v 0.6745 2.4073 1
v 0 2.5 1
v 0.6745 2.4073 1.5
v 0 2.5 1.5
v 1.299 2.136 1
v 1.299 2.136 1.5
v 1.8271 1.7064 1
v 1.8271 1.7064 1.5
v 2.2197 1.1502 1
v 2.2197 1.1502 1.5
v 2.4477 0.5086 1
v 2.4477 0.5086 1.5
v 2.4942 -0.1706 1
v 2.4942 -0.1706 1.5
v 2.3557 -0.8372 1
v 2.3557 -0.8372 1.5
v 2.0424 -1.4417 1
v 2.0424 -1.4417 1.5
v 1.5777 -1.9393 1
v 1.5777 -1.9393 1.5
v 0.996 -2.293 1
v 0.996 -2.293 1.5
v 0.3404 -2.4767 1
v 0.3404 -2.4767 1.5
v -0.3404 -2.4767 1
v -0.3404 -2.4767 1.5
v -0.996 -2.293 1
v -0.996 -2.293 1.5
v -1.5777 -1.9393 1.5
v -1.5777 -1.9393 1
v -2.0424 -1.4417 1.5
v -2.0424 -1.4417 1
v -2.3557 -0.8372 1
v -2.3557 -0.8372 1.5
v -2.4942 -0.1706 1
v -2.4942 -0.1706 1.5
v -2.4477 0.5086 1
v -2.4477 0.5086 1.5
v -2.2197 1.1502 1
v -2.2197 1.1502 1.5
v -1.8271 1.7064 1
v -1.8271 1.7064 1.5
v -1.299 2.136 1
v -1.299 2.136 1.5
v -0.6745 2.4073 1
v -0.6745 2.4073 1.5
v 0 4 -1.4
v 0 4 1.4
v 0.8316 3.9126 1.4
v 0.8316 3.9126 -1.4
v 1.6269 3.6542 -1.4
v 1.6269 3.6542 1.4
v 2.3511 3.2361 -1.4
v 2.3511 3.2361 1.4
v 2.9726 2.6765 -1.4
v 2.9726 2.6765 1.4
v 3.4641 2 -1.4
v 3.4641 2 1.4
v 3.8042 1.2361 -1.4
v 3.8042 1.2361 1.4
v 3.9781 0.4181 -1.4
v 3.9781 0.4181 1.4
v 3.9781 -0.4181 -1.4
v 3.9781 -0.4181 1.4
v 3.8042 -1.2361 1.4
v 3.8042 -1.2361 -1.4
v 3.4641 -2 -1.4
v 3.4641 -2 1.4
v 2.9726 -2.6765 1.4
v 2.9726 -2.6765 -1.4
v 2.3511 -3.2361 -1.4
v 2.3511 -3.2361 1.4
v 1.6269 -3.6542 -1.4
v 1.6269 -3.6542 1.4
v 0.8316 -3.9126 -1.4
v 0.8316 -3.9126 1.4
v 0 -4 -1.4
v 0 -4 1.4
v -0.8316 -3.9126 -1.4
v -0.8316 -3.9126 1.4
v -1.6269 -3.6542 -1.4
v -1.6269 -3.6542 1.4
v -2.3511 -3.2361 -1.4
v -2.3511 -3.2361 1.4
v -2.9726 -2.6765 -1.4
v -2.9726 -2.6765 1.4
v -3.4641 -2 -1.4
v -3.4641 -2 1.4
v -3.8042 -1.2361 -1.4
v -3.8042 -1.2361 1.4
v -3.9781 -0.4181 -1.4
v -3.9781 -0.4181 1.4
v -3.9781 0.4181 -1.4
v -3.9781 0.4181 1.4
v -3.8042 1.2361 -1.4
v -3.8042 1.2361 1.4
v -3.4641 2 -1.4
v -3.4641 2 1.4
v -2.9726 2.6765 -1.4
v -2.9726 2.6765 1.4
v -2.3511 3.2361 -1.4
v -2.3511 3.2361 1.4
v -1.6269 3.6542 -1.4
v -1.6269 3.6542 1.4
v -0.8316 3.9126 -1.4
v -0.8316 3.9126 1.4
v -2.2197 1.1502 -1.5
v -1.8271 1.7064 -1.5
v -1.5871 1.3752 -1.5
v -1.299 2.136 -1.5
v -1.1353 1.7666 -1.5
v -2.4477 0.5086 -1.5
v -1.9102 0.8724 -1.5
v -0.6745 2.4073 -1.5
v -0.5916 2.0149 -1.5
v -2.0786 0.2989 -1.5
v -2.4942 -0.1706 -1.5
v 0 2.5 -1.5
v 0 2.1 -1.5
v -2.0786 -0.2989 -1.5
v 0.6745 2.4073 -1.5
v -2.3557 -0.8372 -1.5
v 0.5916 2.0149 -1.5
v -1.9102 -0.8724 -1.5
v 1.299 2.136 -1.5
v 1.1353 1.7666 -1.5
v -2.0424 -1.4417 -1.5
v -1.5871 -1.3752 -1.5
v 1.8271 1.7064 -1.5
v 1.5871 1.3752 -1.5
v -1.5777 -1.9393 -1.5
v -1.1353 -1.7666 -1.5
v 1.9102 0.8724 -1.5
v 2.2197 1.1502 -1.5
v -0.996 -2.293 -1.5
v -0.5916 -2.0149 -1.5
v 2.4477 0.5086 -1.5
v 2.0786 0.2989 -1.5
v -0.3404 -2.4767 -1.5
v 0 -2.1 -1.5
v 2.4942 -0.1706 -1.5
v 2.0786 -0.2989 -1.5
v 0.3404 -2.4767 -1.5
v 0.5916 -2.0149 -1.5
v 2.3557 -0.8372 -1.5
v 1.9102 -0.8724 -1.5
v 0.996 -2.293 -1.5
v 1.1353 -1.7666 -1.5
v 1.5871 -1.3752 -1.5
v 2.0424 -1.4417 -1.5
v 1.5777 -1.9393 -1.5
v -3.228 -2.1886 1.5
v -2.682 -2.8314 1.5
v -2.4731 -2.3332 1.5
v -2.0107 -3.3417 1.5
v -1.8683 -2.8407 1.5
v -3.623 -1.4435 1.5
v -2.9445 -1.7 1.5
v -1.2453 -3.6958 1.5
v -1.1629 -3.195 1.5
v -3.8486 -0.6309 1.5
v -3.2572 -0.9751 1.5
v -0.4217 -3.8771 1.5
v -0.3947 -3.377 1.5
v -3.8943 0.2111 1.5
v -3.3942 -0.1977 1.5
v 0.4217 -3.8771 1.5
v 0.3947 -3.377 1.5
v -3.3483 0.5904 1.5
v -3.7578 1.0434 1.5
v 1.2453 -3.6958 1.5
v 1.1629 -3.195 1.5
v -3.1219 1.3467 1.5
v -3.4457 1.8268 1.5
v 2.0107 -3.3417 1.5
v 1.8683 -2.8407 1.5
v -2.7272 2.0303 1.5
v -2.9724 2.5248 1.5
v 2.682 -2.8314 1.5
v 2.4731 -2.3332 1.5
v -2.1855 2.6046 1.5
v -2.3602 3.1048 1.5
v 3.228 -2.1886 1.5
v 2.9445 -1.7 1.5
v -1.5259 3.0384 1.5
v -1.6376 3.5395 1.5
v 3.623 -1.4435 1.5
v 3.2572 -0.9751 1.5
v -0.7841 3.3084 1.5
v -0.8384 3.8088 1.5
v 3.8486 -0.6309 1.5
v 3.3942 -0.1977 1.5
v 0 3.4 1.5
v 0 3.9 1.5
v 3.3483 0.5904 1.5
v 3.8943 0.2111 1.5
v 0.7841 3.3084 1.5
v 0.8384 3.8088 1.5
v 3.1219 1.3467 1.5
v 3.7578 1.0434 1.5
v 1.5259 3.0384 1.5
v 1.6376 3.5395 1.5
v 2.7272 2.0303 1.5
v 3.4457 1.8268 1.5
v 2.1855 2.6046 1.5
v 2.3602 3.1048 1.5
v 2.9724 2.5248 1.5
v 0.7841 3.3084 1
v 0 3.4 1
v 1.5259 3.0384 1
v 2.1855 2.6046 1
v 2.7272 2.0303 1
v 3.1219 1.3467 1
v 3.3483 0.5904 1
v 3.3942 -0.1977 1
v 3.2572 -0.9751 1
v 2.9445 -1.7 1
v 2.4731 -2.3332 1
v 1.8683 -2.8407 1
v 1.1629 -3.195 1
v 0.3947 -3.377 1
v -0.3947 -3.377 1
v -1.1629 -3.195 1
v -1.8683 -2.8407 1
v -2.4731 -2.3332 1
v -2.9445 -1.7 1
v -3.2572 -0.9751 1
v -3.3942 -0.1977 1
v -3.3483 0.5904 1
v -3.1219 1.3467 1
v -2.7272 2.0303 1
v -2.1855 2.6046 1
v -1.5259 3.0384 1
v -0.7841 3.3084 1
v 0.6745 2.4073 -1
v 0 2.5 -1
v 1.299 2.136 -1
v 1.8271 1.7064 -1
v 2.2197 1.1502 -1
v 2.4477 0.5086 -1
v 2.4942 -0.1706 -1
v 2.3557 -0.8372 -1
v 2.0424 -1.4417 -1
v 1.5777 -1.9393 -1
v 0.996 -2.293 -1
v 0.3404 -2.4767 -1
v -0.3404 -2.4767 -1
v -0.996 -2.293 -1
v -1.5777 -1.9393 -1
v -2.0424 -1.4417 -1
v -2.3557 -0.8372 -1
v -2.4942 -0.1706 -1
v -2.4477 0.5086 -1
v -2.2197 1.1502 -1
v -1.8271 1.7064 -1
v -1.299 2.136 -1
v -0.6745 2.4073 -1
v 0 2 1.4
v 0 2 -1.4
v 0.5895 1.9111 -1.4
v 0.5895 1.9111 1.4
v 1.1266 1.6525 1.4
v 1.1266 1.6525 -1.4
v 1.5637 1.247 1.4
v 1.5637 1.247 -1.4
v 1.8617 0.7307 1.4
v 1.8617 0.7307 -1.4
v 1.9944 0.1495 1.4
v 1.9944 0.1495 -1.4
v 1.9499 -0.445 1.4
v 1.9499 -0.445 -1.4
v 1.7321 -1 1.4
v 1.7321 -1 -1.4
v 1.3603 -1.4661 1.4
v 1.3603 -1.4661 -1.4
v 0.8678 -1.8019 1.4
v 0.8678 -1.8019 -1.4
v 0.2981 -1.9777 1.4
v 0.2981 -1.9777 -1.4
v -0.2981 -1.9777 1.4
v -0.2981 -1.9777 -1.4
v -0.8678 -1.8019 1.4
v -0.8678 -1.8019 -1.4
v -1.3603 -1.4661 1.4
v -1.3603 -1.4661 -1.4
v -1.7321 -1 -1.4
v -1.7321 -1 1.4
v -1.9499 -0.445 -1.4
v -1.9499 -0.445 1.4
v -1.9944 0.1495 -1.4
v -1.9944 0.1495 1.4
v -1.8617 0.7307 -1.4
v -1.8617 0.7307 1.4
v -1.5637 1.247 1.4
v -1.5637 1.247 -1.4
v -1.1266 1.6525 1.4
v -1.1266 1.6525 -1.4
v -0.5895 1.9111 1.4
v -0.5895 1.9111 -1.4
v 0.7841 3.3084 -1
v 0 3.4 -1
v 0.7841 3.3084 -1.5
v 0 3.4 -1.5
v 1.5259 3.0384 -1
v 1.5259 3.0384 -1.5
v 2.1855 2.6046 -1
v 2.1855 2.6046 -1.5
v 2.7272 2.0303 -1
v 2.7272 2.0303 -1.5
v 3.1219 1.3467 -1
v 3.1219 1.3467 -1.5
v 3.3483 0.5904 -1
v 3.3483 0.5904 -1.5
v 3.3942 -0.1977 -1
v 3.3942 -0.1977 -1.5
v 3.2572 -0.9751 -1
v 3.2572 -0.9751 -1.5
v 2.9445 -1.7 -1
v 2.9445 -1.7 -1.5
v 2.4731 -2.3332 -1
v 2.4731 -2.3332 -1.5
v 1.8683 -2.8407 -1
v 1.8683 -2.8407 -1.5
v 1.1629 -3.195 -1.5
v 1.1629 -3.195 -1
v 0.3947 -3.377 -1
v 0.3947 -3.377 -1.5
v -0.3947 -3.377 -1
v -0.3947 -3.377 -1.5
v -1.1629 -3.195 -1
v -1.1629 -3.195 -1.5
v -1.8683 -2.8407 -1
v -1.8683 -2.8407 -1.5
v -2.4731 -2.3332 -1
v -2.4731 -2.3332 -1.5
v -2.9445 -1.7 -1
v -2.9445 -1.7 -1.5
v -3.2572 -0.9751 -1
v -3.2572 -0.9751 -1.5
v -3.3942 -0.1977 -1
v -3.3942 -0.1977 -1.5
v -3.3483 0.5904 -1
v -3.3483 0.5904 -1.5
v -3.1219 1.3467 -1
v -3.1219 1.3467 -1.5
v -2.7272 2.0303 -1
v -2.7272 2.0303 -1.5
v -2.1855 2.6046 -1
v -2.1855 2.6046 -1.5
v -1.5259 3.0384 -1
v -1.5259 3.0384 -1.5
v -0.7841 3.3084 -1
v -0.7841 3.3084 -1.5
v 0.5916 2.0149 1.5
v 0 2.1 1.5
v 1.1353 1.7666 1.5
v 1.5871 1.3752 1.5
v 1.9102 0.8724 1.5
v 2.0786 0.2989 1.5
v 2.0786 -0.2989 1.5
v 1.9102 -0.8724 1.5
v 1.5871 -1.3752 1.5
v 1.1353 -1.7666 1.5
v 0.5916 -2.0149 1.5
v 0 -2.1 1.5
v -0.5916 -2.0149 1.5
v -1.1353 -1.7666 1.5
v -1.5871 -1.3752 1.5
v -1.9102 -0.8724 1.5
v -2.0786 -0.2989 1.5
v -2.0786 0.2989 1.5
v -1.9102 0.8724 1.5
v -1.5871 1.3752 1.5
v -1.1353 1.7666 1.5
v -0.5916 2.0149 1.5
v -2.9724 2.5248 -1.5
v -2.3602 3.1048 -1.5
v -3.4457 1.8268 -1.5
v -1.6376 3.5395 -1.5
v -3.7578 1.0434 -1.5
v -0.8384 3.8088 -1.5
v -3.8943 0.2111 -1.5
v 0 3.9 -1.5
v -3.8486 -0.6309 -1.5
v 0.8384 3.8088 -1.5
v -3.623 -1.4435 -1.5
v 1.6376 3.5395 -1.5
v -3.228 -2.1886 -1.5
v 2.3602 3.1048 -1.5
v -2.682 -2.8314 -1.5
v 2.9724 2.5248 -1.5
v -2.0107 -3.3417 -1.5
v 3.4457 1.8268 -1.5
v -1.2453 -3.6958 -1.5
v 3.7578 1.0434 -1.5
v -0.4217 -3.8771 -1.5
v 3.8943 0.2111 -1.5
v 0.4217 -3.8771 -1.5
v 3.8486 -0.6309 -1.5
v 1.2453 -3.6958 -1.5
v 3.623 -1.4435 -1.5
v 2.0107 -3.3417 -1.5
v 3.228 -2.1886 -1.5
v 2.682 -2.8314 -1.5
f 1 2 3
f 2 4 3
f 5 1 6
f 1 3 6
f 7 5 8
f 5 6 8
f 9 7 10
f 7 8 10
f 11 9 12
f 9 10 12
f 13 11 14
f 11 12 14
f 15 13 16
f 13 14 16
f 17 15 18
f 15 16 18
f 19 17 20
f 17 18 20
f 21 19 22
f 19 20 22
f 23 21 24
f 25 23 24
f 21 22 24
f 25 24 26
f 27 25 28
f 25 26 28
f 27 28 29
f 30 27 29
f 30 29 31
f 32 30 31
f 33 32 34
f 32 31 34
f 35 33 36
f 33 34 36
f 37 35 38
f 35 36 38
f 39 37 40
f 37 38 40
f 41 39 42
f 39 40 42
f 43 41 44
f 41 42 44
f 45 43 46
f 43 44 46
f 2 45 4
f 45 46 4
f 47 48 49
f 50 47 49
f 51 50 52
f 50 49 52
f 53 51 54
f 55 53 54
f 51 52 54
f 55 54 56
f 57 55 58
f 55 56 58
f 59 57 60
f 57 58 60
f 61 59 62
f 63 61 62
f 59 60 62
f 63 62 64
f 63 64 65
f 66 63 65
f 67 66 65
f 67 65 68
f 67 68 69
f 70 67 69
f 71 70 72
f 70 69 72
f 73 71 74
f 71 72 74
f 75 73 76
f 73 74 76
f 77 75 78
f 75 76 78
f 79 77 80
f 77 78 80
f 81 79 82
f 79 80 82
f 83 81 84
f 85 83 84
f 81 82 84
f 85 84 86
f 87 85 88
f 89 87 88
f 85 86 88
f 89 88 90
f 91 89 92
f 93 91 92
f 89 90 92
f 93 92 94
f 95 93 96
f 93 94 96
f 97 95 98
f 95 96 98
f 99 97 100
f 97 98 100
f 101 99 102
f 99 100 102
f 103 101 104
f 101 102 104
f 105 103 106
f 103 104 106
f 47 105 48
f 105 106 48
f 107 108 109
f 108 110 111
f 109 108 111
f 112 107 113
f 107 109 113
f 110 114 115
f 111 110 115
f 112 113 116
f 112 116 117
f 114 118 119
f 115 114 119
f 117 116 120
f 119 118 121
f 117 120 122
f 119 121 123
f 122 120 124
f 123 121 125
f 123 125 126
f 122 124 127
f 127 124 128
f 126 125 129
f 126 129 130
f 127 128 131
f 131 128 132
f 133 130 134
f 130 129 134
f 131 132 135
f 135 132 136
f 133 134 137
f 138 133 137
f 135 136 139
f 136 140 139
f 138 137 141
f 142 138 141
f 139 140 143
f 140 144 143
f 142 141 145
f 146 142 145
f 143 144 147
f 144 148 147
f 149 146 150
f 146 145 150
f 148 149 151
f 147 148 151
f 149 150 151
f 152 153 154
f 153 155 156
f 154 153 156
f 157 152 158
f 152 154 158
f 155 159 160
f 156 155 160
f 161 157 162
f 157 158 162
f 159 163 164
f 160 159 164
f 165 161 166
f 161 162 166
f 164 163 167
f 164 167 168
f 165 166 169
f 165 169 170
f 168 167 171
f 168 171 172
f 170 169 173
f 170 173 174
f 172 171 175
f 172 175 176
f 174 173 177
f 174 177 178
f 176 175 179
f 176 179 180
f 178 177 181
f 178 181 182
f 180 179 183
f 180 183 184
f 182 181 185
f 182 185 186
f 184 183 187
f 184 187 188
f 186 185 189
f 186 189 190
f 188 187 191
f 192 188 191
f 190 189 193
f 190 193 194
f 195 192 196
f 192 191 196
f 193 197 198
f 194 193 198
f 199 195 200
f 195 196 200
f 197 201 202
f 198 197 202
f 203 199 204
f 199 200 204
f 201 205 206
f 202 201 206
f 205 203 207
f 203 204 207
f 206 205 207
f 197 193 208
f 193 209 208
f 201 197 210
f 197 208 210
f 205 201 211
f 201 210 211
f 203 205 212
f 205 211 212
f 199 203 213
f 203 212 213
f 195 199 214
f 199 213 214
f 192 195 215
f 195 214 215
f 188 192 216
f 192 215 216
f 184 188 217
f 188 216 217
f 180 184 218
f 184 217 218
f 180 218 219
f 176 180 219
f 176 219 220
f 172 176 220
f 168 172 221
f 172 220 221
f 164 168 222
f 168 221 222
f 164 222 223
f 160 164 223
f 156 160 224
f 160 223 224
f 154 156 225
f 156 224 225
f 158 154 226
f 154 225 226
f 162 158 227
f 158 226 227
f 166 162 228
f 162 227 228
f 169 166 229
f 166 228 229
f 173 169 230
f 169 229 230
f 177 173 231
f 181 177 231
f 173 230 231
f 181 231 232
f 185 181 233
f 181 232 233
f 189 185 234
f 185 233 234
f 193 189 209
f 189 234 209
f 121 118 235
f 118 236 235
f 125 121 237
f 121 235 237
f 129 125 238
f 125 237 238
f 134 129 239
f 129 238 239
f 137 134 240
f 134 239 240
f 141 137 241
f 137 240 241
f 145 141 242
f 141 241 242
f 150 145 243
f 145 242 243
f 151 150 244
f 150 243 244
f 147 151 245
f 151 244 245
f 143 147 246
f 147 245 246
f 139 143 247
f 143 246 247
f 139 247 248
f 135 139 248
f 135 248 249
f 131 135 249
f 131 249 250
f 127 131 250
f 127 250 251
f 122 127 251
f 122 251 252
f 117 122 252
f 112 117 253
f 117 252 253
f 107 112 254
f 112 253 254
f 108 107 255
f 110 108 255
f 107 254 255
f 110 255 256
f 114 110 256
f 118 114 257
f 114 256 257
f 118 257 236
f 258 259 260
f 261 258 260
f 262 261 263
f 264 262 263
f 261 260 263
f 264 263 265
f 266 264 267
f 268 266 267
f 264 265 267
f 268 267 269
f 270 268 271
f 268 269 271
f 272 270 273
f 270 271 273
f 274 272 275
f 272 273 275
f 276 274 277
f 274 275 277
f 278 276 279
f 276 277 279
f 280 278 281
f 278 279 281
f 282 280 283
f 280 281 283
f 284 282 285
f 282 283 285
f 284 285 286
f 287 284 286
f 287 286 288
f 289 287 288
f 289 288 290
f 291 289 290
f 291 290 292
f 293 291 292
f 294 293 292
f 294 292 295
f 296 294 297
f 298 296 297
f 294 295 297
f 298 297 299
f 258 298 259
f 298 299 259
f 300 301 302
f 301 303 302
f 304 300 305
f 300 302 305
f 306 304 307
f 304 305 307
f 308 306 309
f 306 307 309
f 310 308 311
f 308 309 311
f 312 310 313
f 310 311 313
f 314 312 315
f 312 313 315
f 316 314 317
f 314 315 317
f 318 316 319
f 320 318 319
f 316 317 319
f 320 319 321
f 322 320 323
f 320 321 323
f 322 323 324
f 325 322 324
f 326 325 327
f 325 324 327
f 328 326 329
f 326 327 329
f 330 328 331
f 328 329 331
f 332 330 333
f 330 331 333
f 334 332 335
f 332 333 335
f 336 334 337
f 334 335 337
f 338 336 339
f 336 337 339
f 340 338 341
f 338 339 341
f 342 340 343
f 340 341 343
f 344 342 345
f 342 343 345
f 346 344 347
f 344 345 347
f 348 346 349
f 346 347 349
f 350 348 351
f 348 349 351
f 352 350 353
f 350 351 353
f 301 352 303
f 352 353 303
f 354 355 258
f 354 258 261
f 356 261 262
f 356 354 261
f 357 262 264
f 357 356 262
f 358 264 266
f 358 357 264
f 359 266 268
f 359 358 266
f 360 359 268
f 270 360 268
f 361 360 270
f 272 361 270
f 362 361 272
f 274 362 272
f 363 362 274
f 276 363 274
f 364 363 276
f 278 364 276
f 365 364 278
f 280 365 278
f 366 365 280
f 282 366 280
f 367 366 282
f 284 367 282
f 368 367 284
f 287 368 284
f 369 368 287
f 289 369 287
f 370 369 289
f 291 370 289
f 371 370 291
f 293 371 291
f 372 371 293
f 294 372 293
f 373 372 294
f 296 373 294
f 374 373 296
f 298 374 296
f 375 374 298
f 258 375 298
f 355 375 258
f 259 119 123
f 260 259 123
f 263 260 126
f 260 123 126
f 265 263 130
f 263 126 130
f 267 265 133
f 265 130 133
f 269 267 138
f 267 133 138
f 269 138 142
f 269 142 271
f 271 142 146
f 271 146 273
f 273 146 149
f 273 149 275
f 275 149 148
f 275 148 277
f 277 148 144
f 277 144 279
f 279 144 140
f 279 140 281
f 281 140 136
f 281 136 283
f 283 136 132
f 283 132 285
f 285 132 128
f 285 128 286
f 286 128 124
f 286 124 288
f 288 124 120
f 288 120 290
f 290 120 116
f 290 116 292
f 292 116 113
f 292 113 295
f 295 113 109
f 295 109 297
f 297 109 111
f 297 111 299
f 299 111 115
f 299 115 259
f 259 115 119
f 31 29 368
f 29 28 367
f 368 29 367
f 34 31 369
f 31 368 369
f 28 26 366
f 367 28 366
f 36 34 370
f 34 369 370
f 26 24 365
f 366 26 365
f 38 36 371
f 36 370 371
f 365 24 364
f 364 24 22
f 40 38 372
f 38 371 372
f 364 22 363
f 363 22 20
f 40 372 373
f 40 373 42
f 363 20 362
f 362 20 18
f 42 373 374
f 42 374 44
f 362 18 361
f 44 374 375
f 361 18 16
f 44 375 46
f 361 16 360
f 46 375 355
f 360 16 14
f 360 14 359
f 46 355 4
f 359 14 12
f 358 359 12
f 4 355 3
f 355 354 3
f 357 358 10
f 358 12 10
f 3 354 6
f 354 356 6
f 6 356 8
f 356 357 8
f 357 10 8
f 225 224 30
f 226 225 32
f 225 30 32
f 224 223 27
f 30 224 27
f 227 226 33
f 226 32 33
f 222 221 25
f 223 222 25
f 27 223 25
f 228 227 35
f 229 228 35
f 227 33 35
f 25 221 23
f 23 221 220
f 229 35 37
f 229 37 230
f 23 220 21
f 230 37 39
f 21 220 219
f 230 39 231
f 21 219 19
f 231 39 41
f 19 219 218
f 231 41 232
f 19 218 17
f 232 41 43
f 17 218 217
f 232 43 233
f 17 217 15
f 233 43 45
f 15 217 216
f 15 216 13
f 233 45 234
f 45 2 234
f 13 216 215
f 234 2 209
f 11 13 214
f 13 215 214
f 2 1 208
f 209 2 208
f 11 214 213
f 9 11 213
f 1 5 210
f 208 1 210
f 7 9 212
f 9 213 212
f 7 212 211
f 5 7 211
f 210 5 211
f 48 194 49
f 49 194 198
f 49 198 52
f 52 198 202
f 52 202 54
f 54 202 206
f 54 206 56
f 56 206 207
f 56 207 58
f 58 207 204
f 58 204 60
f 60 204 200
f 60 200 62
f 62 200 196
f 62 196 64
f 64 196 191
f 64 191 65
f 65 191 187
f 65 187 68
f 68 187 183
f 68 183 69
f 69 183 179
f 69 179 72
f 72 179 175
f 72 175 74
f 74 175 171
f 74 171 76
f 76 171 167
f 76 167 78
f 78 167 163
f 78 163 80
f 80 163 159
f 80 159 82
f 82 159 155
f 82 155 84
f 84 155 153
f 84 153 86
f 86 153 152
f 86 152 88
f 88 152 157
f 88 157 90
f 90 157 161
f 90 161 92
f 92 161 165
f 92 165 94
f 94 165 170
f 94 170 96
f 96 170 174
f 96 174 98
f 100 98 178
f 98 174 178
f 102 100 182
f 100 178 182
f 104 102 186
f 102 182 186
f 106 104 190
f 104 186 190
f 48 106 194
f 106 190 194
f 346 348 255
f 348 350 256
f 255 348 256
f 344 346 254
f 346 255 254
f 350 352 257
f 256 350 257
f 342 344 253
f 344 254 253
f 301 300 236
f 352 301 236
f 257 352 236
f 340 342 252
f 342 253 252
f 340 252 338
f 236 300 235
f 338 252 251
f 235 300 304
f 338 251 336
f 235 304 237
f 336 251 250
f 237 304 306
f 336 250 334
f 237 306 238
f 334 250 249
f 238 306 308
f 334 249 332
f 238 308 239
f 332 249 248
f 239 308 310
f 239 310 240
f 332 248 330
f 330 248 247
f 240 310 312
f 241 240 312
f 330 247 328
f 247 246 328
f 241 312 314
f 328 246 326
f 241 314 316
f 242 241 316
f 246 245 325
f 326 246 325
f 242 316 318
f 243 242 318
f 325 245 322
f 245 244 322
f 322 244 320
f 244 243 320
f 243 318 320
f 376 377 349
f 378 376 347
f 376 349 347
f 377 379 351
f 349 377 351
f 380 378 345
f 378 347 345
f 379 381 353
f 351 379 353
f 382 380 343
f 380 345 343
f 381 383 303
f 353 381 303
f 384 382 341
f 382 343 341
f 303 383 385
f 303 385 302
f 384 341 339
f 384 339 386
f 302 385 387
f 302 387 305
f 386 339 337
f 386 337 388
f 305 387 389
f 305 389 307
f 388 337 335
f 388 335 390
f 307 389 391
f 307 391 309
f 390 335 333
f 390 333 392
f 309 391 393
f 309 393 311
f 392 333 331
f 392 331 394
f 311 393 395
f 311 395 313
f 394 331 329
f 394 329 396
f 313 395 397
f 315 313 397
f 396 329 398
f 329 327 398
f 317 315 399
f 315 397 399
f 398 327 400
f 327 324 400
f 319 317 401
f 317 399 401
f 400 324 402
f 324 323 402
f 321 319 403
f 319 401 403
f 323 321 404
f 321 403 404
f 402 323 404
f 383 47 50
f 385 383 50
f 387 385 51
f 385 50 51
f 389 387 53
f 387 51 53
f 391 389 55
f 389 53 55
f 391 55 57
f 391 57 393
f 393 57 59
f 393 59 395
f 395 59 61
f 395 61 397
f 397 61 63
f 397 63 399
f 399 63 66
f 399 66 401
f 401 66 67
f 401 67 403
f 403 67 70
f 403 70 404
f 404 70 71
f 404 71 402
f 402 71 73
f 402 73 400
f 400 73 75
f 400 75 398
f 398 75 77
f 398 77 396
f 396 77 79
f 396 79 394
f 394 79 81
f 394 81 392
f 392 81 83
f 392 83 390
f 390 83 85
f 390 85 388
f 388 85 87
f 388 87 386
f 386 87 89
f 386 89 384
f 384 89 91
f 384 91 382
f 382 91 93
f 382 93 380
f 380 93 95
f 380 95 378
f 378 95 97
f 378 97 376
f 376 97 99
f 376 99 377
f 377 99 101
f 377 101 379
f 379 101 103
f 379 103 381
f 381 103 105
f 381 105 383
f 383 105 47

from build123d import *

# Parameters (mm, degrees)
FASE1_SIZE = 0.1


with BuildPart() as part:
    # Skizze2 → Rotation1 (revolve)
    with BuildSketch(Plane(origin=(0, 0, 0), x_dir=(0, 0, -1), z_dir=(1, 0, 0))):
        Polygon((-1.5, 2), (1.5, 2), (1.5, 2.5), (1, 2.5), (1, 3.4), (1.5, 3.4), (1.5, 4), (-1.5, 4), (-1.5, 3.4), (-1, 3.4), (-1, 2.5), (-1.5, 2.5), align=None)
    revolve(axis=Axis((0, 0, 11.845846522), (0, 0, -1)))

    # Fase1
    fase1_edges = [part.edges().sort_by_distance(p)[0] for p in [
        (0, -4, 1.5),
        (0, -4, -1.5),
        (0, -2, -1.5),
        (0, -2, 1.5),
    ]]
    chamfer(fase1_edges, length=FASE1_SIZE)


solid = part.part
